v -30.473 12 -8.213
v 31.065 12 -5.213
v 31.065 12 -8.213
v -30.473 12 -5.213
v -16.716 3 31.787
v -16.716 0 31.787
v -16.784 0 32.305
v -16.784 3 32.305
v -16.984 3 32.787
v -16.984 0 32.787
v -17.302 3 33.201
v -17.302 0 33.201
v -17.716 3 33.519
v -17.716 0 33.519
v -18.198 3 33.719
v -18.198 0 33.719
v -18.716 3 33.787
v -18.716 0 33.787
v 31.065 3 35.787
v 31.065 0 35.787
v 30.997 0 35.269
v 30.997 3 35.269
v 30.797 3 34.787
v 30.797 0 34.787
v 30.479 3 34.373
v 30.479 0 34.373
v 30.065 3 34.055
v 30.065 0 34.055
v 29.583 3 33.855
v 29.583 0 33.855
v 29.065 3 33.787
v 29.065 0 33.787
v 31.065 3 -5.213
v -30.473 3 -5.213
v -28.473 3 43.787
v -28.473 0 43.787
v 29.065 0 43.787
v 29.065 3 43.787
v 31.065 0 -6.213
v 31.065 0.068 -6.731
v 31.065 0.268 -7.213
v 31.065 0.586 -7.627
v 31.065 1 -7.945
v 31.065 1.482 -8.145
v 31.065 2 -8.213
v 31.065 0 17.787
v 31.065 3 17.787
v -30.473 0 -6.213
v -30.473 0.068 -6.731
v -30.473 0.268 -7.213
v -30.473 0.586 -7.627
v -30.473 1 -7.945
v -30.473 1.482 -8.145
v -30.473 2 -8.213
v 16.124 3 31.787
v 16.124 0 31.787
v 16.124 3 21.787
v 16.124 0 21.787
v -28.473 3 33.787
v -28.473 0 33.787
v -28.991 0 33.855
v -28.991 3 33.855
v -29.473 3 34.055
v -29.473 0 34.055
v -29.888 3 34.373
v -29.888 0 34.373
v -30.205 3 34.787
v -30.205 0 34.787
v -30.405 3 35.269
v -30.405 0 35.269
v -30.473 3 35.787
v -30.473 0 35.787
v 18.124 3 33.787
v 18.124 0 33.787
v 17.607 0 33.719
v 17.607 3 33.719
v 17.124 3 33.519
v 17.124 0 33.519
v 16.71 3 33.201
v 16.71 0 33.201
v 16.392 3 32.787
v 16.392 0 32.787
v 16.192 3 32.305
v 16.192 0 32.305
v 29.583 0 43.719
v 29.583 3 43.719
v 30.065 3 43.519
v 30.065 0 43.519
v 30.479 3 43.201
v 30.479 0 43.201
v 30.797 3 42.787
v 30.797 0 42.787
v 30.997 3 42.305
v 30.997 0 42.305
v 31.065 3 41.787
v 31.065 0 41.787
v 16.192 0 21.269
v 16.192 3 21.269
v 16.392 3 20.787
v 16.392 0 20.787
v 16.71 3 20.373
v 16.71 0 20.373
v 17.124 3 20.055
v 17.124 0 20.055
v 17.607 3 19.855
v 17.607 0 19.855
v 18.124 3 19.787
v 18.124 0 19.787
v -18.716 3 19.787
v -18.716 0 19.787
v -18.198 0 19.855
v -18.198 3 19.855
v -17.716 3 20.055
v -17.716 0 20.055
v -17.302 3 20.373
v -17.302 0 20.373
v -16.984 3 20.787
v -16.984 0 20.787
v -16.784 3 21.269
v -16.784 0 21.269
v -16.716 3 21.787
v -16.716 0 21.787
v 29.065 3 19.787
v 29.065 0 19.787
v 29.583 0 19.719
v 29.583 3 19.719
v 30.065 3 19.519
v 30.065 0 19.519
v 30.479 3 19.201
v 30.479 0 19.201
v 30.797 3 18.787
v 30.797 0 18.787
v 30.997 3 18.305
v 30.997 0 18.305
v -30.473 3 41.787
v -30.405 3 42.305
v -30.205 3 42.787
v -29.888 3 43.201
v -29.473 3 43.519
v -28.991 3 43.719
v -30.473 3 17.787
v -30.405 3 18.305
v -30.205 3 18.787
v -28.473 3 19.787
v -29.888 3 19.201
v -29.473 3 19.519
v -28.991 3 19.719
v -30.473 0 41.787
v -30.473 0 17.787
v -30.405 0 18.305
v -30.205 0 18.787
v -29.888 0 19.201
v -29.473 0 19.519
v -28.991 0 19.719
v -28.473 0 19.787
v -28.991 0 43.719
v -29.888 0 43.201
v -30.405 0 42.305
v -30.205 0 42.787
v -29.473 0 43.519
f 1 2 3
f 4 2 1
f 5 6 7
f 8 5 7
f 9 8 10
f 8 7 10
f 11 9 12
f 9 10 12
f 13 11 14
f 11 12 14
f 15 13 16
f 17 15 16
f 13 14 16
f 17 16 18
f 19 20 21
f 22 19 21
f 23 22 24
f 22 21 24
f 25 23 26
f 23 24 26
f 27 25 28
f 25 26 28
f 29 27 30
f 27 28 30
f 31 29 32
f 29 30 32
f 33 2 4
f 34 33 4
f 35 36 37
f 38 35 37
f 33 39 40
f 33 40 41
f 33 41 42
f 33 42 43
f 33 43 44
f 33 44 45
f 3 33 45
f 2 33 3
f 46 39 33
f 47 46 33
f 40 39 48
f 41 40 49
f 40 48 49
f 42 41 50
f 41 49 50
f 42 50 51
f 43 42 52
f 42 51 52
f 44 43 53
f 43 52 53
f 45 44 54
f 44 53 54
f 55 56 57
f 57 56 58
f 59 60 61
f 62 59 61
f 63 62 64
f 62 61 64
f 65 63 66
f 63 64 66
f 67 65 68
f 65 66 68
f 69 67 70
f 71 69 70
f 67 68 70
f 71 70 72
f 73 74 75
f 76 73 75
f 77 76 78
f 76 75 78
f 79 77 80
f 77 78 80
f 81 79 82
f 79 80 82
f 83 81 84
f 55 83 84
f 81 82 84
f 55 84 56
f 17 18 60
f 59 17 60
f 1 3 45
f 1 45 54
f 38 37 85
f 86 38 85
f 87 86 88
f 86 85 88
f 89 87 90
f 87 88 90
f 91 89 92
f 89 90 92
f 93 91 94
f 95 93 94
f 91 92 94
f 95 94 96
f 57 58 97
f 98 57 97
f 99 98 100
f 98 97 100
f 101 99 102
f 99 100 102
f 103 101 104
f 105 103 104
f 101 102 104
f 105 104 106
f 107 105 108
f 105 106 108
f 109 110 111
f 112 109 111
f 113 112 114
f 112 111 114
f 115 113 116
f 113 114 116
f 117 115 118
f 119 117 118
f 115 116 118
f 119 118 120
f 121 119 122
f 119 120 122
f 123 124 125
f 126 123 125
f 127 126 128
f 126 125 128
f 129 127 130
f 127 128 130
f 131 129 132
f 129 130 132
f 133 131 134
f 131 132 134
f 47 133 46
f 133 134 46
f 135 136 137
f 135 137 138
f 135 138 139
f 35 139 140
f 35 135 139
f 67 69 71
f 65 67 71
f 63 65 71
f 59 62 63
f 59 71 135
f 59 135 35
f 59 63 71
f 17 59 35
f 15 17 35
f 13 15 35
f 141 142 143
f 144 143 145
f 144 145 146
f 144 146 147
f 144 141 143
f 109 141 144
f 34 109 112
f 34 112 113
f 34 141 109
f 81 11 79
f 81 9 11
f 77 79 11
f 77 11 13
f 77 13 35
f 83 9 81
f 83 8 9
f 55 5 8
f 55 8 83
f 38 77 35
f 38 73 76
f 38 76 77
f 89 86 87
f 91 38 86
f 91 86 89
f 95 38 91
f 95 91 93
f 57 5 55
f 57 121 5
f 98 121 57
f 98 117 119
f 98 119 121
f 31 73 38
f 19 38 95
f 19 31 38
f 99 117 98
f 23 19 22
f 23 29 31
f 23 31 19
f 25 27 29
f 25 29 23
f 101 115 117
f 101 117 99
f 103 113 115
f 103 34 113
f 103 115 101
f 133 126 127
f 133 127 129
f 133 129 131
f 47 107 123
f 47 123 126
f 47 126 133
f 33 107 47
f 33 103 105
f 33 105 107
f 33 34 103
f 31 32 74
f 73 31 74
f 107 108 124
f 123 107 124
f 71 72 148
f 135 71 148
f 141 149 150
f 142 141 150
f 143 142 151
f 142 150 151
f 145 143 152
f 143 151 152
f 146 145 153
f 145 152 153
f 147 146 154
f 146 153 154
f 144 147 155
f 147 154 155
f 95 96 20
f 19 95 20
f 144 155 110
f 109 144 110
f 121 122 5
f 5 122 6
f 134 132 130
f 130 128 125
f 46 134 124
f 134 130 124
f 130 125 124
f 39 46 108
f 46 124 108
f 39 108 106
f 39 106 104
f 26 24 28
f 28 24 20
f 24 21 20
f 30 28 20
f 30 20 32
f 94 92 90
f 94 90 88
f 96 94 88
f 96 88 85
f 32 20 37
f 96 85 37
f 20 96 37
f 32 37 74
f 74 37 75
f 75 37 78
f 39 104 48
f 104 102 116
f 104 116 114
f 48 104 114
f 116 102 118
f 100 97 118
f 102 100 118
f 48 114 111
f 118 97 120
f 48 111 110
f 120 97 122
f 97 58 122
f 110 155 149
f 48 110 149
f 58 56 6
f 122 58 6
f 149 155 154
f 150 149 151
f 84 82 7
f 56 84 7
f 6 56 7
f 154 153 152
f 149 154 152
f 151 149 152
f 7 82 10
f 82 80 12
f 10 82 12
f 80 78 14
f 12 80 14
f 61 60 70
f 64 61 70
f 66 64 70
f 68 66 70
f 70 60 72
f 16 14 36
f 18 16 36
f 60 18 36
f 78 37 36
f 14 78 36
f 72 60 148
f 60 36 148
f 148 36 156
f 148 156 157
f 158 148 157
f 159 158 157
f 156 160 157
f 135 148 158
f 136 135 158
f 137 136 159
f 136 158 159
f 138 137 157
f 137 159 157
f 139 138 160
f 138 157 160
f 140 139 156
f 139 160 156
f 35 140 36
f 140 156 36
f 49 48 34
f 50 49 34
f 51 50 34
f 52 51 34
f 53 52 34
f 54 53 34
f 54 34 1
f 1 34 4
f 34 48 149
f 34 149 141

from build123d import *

# Parameters (mm, degrees)
BOSS_EXTRUDE1_DEPTH = 3
SKETCH2_W           = 61.538461538
SKETCH2_H           = 12
BOSS_EXTRUDE2_DEPTH = 3
FILLET1_R           = 2


with BuildPart() as part:
    # Sketch1 → Boss-Extrude1 (new body)
    with BuildSketch(Plane(origin=(0, 0, 0), x_dir=(1, 0, 0), z_dir=(0, 1, 0))):
        with BuildLine():
            Line((18.124260355, -19.786982249), (29.065088757, -19.786982249))
            ThreePointArc((29.065088757, -19.786982249), (30.47930232, -19.201195811), (31.065088757, -17.786982249))
            Line((31.065088757, -17.786982249), (31.065088757, 5.213017751))
            Line((31.065088757, 5.213017751), (-30.473372781, 5.213017751))
            Line((-30.473372781, 5.213017751), (-30.473372781, -17.786982249))
            ThreePointArc((-30.473372781, -17.786982249), (-29.887586343, -19.201195811), (-28.473372781, -19.786982249))
            Line((-28.473372781, -19.786982249), (-18.715976331, -19.786982249))
            ThreePointArc((-18.715976331, -19.786982249), (-17.301762769, -20.372768686), (-16.715976331, -21.786982249))
            Line((-16.715976331, -21.786982249), (-16.715976331, -31.786982249))
            ThreePointArc((-16.715976331, -31.786982249), (-17.301762769, -33.201195811), (-18.715976331, -33.786982249))
            Line((-18.715976331, -33.786982249), (-28.473372781, -33.786982249))
            ThreePointArc((-28.473372781, -33.786982249), (-29.887586343, -34.372768686), (-30.473372781, -35.786982249))
            Line((-30.473372781, -35.786982249), (-30.473372781, -41.786982249))
            ThreePointArc((-30.473372781, -41.786982249), (-29.887586343, -43.201195811), (-28.473372781, -43.786982249))
            Line((-28.473372781, -43.786982249), (29.065088757, -43.786982249))
            ThreePointArc((29.065088757, -43.786982249), (30.47930232, -43.201195811), (31.065088757, -41.786982249))
            Line((31.065088757, -41.786982249), (31.065088757, -35.786982249))
            ThreePointArc((31.065088757, -35.786982249), (30.47930232, -34.372768686), (29.065088757, -33.786982249))
            Line((29.065088757, -33.786982249), (18.124260355, -33.786982249))
            ThreePointArc((18.124260355, -33.786982249), (16.710046793, -33.201195811), (16.124260355, -31.786982249))
            Line((16.124260355, -31.786982249), (16.124260355, -21.786982249))
            ThreePointArc((16.124260355, -21.786982249), (16.710046793, -20.372768686), (18.124260355, -19.786982249))
        make_face()
    extrude(amount=BOSS_EXTRUDE1_DEPTH)

    # Sketch2 → Boss-Extrude2 (add)
    with BuildSketch(Plane(origin=(0, 0, -5.213017751), x_dir=(-1, 0, 0), z_dir=(0, 0, -1))):
        with Locations((-0.295857988, 6)):
            Rectangle(SKETCH2_W, SKETCH2_H)
    extrude(amount=BOSS_EXTRUDE2_DEPTH)

    # Fillet1
    fillet1_edges = [part.edges().sort_by_distance(p)[0] for p in [
        (0.295857988, 0, -8.213017751),
    ]]
    fillet(fillet1_edges, radius=FILLET1_R)


solid = part.part
